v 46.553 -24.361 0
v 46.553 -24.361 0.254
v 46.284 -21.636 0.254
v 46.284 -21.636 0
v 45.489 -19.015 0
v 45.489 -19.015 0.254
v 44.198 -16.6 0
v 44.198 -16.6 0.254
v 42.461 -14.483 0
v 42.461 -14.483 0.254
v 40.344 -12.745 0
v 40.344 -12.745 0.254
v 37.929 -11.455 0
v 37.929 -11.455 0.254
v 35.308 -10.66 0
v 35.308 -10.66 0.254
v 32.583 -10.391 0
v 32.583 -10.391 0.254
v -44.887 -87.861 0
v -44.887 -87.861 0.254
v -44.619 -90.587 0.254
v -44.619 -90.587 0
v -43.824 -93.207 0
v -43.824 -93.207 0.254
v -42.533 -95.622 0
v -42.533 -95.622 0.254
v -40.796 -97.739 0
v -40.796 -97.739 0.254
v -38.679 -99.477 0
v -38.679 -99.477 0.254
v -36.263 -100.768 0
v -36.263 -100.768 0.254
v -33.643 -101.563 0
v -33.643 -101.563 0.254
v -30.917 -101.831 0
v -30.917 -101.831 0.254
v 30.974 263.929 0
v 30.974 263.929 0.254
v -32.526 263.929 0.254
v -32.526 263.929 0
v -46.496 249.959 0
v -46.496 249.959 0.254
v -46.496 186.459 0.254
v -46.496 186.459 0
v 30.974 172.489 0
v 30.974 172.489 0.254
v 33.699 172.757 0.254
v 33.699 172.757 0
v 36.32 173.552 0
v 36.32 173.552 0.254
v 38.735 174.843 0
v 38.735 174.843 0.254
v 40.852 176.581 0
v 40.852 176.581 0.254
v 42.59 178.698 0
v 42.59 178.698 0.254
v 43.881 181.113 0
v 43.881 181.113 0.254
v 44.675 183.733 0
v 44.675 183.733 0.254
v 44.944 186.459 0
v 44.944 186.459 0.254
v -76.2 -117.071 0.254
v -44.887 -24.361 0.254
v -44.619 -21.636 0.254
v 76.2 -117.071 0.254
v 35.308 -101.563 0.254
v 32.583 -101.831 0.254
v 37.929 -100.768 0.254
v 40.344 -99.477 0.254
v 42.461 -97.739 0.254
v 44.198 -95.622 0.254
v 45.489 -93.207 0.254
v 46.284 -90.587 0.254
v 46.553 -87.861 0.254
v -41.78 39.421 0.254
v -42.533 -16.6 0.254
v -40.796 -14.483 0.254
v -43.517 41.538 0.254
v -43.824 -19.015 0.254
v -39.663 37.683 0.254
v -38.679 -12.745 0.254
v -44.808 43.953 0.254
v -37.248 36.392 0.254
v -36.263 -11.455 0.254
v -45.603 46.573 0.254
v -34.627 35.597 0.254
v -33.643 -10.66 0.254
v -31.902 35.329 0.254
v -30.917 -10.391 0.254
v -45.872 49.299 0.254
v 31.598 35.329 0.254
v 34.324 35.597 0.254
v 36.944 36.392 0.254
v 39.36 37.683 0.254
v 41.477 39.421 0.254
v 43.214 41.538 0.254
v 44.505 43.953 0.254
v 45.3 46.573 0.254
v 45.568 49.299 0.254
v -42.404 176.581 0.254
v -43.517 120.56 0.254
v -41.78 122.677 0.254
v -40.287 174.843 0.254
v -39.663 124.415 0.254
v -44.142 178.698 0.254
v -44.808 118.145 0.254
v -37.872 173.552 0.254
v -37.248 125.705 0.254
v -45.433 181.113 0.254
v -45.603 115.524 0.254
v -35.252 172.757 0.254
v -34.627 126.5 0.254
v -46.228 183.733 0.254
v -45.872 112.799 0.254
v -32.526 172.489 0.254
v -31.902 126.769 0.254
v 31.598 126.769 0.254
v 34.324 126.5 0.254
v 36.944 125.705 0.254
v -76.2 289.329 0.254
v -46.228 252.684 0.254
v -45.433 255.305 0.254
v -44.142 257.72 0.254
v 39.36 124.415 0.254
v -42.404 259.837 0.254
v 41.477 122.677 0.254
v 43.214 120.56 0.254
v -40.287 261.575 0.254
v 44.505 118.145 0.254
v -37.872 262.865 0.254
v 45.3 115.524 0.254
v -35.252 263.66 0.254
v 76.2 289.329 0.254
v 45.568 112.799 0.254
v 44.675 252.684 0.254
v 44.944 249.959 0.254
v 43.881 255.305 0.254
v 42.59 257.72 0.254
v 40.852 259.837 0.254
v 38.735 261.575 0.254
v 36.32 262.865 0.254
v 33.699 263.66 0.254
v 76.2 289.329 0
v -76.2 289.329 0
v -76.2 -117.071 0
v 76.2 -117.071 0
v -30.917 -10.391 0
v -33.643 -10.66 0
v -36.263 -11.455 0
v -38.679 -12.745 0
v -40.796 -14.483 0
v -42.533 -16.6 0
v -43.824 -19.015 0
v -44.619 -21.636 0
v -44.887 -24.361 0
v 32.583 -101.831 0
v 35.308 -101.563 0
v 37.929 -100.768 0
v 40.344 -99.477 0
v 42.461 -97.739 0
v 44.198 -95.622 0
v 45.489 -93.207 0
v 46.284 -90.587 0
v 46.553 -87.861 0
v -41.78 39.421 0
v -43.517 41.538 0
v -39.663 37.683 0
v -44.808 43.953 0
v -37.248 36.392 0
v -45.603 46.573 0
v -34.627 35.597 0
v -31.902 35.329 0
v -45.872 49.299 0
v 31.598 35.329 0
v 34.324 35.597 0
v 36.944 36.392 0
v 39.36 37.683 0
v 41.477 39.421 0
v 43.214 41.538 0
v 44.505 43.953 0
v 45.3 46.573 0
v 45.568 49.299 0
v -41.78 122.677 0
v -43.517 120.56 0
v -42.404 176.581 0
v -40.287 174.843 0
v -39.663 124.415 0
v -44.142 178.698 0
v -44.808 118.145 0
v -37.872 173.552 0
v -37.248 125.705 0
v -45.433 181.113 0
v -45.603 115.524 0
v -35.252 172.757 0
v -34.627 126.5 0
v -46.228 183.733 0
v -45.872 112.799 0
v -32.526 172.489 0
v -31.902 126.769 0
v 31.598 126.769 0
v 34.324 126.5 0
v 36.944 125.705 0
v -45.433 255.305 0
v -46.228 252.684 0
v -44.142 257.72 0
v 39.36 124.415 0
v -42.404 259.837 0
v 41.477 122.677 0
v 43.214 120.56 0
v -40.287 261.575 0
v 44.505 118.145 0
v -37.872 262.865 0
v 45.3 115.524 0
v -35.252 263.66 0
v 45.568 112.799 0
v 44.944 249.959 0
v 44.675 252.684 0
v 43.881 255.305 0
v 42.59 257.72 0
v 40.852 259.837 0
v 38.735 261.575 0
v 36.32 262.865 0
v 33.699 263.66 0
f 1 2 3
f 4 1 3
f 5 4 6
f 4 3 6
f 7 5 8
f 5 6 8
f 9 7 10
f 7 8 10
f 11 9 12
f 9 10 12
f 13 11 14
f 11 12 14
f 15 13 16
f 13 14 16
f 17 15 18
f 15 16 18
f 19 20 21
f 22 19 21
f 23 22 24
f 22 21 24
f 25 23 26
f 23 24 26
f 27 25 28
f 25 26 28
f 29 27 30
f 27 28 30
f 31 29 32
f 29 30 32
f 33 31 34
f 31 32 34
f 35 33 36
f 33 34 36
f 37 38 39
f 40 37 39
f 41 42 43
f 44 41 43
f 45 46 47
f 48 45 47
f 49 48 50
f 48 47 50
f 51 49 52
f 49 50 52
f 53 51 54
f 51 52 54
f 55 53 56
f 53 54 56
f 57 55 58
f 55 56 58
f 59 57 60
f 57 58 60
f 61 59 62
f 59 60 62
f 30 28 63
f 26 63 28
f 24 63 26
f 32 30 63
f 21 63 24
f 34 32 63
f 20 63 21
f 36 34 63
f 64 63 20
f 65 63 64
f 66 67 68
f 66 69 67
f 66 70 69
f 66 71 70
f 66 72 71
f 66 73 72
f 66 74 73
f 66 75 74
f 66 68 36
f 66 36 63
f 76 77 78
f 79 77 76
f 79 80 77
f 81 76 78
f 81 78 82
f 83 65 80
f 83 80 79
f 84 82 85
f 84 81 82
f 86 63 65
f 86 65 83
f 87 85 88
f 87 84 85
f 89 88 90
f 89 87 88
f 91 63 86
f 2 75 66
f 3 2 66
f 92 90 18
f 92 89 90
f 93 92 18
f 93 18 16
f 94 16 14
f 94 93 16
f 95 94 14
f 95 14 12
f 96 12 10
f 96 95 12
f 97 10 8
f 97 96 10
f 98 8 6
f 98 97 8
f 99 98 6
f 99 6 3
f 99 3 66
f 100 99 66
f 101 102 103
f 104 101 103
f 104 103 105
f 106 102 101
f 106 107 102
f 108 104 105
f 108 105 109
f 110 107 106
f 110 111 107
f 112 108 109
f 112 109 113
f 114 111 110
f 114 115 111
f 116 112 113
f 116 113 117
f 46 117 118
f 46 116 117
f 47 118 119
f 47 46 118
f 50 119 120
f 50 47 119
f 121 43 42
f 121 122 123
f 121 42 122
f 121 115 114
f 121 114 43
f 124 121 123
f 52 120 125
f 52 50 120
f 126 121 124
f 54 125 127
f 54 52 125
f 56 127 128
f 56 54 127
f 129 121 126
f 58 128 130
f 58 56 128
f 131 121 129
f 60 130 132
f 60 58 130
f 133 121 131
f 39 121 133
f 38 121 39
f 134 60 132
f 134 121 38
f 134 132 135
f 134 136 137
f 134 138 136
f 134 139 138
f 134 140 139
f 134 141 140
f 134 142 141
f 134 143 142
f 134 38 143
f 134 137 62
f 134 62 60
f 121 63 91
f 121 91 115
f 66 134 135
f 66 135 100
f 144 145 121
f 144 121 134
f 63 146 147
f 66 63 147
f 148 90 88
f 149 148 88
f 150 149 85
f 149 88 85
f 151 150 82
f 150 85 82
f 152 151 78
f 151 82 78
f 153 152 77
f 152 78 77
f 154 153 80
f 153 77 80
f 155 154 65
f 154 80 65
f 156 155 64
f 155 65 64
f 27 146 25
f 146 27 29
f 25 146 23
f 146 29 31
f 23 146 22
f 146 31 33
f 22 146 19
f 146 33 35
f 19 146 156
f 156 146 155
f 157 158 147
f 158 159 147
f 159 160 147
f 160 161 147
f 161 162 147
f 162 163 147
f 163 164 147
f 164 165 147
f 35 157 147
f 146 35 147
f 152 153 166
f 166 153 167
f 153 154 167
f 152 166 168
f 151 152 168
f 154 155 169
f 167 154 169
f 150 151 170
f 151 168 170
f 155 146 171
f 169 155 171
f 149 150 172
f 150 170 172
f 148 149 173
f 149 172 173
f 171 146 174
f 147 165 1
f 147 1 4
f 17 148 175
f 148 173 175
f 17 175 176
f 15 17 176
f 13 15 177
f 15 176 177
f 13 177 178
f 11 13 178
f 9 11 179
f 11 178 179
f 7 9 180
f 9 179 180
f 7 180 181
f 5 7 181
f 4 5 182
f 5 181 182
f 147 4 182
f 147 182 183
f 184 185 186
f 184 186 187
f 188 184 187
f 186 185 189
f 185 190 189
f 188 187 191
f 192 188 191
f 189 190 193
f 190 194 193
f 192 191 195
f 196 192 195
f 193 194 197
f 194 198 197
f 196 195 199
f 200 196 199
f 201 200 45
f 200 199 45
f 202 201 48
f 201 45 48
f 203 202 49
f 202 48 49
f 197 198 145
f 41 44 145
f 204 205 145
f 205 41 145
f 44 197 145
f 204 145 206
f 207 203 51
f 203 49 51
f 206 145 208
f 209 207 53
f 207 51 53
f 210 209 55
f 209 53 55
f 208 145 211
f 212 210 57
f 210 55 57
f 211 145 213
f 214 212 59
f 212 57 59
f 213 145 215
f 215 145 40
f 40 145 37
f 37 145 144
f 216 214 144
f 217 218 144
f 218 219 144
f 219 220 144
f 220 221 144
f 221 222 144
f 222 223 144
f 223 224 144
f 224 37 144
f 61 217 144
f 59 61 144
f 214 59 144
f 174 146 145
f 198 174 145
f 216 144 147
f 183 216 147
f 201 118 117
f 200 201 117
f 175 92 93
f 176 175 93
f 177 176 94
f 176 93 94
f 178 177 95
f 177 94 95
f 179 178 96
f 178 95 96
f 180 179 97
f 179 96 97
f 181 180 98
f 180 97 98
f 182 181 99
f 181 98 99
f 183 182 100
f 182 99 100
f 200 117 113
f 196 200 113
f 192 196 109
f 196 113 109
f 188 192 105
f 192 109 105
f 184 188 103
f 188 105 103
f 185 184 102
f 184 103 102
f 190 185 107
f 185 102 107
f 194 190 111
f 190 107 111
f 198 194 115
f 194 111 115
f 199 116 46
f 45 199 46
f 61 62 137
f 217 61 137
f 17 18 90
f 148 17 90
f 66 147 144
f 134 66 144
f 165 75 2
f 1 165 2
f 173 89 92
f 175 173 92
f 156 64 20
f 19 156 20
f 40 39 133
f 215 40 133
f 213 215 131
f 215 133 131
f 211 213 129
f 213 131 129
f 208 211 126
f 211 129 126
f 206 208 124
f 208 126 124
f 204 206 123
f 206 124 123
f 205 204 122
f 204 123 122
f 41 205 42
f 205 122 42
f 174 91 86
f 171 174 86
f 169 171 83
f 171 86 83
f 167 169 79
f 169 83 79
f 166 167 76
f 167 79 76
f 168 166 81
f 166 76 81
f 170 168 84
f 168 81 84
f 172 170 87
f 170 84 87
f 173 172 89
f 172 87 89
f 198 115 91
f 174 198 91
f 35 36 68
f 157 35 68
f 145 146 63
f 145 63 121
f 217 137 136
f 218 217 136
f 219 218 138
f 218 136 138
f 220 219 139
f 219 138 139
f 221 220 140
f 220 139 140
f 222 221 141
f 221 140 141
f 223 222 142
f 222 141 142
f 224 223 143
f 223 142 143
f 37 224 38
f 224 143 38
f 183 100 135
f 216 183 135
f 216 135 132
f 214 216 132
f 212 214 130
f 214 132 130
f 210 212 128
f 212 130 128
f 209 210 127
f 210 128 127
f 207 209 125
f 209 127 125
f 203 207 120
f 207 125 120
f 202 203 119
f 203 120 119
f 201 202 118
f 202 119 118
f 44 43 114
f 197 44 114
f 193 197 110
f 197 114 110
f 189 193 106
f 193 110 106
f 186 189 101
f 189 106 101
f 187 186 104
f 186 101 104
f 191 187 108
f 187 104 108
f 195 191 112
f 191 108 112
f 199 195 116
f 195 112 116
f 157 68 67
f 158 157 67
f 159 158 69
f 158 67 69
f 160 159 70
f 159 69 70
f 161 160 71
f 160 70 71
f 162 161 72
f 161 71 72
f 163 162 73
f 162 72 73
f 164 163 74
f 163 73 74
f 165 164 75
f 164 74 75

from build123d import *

# Parameters (mm, degrees)
F0_W     = 152.4
F0_H     = 406.4
F1_DEPTH = 0.254
F4_DEPTH = 0.255
F5_DEPTH = 0.255
F7_DEPTH = 0.255


with BuildPart() as f1:
    # F0 (on Top) → F1 (new body)
    with BuildSketch(Plane.XY):
        with Locations((0, 86.128879)):
            Rectangle(F0_W, F0_H)
    extrude(amount=F1_DEPTH)

    # F3 (on face) → F4 (cut, through all)
    with BuildSketch(Plane.XY.offset(0.254)):
        with BuildLine():
            Line((31.598285, 126.768879), (-31.901715, 126.768879))
            ThreePointArc((-31.901715, 126.768879), (-41.779997, 122.677161), (-45.871715, 112.798879))
            Line((-45.871715, 112.798879), (-45.871715, 49.298879))
            ThreePointArc((-45.871715, 49.298879), (-41.779997, 39.420598), (-31.901715, 35.328879))
            Line((-31.901715, 35.328879), (31.598285, 35.328879))
            ThreePointArc((31.598285, 35.328879), (41.476567, 39.420598), (45.568285, 49.298879))
            Line((45.568285, 49.298879), (45.568285, 112.798879))
            ThreePointArc((45.568285, 112.798879), (41.476567, 122.677161), (31.598285, 126.768879))
        make_face()
    extrude(amount=-F4_DEPTH, mode=Mode.SUBTRACT)

    # F2 (on face) → F5 (cut, through all)
    with BuildSketch(Plane.XY.offset(0.254)):
        with BuildLine():
            Line((30.973906, 263.928879), (-32.526094, 263.928879))
            ThreePointArc((-32.526094, 263.928879), (-42.404376, 259.837161), (-46.496094, 249.958879))
            Line((-46.496094, 249.958879), (-46.496094, 186.458879))
            ThreePointArc((-46.496094, 186.458879), (-42.404376, 176.580598), (-32.526094, 172.488879))
            Line((-32.526094, 172.488879), (30.973906, 172.488879))
            ThreePointArc((30.973906, 172.488879), (40.852188, 176.580598), (44.943906, 186.458879))
            Line((44.943906, 186.458879), (44.943906, 249.958879))
            ThreePointArc((44.943906, 249.958879), (40.852188, 259.837161), (30.973906, 263.928879))
        make_face()
    extrude(amount=-F5_DEPTH, mode=Mode.SUBTRACT)

    # F6 (on face) → F7 (cut, through all)
    with BuildSketch(Plane.XY.offset(0.254)):
        with BuildLine():
            Line((32.582681, -10.391121), (-30.917319, -10.391121))
            ThreePointArc((-30.917319, -10.391121), (-40.7956, -14.482839), (-44.887319, -24.361121))
            Line((-44.887319, -24.361121), (-44.887319, -87.861121))
            ThreePointArc((-44.887319, -87.861121), (-40.7956, -97.739402), (-30.917319, -101.831121))
            Line((-30.917319, -101.831121), (32.582681, -101.831121))
            ThreePointArc((32.582681, -101.831121), (42.460963, -97.739402), (46.552681, -87.861121))
            Line((46.552681, -87.861121), (46.552681, -24.361121))
            ThreePointArc((46.552681, -24.361121), (42.460963, -14.482839), (32.582681, -10.391121))
        make_face()
    extrude(amount=-F7_DEPTH, mode=Mode.SUBTRACT)


solid = f1.part
